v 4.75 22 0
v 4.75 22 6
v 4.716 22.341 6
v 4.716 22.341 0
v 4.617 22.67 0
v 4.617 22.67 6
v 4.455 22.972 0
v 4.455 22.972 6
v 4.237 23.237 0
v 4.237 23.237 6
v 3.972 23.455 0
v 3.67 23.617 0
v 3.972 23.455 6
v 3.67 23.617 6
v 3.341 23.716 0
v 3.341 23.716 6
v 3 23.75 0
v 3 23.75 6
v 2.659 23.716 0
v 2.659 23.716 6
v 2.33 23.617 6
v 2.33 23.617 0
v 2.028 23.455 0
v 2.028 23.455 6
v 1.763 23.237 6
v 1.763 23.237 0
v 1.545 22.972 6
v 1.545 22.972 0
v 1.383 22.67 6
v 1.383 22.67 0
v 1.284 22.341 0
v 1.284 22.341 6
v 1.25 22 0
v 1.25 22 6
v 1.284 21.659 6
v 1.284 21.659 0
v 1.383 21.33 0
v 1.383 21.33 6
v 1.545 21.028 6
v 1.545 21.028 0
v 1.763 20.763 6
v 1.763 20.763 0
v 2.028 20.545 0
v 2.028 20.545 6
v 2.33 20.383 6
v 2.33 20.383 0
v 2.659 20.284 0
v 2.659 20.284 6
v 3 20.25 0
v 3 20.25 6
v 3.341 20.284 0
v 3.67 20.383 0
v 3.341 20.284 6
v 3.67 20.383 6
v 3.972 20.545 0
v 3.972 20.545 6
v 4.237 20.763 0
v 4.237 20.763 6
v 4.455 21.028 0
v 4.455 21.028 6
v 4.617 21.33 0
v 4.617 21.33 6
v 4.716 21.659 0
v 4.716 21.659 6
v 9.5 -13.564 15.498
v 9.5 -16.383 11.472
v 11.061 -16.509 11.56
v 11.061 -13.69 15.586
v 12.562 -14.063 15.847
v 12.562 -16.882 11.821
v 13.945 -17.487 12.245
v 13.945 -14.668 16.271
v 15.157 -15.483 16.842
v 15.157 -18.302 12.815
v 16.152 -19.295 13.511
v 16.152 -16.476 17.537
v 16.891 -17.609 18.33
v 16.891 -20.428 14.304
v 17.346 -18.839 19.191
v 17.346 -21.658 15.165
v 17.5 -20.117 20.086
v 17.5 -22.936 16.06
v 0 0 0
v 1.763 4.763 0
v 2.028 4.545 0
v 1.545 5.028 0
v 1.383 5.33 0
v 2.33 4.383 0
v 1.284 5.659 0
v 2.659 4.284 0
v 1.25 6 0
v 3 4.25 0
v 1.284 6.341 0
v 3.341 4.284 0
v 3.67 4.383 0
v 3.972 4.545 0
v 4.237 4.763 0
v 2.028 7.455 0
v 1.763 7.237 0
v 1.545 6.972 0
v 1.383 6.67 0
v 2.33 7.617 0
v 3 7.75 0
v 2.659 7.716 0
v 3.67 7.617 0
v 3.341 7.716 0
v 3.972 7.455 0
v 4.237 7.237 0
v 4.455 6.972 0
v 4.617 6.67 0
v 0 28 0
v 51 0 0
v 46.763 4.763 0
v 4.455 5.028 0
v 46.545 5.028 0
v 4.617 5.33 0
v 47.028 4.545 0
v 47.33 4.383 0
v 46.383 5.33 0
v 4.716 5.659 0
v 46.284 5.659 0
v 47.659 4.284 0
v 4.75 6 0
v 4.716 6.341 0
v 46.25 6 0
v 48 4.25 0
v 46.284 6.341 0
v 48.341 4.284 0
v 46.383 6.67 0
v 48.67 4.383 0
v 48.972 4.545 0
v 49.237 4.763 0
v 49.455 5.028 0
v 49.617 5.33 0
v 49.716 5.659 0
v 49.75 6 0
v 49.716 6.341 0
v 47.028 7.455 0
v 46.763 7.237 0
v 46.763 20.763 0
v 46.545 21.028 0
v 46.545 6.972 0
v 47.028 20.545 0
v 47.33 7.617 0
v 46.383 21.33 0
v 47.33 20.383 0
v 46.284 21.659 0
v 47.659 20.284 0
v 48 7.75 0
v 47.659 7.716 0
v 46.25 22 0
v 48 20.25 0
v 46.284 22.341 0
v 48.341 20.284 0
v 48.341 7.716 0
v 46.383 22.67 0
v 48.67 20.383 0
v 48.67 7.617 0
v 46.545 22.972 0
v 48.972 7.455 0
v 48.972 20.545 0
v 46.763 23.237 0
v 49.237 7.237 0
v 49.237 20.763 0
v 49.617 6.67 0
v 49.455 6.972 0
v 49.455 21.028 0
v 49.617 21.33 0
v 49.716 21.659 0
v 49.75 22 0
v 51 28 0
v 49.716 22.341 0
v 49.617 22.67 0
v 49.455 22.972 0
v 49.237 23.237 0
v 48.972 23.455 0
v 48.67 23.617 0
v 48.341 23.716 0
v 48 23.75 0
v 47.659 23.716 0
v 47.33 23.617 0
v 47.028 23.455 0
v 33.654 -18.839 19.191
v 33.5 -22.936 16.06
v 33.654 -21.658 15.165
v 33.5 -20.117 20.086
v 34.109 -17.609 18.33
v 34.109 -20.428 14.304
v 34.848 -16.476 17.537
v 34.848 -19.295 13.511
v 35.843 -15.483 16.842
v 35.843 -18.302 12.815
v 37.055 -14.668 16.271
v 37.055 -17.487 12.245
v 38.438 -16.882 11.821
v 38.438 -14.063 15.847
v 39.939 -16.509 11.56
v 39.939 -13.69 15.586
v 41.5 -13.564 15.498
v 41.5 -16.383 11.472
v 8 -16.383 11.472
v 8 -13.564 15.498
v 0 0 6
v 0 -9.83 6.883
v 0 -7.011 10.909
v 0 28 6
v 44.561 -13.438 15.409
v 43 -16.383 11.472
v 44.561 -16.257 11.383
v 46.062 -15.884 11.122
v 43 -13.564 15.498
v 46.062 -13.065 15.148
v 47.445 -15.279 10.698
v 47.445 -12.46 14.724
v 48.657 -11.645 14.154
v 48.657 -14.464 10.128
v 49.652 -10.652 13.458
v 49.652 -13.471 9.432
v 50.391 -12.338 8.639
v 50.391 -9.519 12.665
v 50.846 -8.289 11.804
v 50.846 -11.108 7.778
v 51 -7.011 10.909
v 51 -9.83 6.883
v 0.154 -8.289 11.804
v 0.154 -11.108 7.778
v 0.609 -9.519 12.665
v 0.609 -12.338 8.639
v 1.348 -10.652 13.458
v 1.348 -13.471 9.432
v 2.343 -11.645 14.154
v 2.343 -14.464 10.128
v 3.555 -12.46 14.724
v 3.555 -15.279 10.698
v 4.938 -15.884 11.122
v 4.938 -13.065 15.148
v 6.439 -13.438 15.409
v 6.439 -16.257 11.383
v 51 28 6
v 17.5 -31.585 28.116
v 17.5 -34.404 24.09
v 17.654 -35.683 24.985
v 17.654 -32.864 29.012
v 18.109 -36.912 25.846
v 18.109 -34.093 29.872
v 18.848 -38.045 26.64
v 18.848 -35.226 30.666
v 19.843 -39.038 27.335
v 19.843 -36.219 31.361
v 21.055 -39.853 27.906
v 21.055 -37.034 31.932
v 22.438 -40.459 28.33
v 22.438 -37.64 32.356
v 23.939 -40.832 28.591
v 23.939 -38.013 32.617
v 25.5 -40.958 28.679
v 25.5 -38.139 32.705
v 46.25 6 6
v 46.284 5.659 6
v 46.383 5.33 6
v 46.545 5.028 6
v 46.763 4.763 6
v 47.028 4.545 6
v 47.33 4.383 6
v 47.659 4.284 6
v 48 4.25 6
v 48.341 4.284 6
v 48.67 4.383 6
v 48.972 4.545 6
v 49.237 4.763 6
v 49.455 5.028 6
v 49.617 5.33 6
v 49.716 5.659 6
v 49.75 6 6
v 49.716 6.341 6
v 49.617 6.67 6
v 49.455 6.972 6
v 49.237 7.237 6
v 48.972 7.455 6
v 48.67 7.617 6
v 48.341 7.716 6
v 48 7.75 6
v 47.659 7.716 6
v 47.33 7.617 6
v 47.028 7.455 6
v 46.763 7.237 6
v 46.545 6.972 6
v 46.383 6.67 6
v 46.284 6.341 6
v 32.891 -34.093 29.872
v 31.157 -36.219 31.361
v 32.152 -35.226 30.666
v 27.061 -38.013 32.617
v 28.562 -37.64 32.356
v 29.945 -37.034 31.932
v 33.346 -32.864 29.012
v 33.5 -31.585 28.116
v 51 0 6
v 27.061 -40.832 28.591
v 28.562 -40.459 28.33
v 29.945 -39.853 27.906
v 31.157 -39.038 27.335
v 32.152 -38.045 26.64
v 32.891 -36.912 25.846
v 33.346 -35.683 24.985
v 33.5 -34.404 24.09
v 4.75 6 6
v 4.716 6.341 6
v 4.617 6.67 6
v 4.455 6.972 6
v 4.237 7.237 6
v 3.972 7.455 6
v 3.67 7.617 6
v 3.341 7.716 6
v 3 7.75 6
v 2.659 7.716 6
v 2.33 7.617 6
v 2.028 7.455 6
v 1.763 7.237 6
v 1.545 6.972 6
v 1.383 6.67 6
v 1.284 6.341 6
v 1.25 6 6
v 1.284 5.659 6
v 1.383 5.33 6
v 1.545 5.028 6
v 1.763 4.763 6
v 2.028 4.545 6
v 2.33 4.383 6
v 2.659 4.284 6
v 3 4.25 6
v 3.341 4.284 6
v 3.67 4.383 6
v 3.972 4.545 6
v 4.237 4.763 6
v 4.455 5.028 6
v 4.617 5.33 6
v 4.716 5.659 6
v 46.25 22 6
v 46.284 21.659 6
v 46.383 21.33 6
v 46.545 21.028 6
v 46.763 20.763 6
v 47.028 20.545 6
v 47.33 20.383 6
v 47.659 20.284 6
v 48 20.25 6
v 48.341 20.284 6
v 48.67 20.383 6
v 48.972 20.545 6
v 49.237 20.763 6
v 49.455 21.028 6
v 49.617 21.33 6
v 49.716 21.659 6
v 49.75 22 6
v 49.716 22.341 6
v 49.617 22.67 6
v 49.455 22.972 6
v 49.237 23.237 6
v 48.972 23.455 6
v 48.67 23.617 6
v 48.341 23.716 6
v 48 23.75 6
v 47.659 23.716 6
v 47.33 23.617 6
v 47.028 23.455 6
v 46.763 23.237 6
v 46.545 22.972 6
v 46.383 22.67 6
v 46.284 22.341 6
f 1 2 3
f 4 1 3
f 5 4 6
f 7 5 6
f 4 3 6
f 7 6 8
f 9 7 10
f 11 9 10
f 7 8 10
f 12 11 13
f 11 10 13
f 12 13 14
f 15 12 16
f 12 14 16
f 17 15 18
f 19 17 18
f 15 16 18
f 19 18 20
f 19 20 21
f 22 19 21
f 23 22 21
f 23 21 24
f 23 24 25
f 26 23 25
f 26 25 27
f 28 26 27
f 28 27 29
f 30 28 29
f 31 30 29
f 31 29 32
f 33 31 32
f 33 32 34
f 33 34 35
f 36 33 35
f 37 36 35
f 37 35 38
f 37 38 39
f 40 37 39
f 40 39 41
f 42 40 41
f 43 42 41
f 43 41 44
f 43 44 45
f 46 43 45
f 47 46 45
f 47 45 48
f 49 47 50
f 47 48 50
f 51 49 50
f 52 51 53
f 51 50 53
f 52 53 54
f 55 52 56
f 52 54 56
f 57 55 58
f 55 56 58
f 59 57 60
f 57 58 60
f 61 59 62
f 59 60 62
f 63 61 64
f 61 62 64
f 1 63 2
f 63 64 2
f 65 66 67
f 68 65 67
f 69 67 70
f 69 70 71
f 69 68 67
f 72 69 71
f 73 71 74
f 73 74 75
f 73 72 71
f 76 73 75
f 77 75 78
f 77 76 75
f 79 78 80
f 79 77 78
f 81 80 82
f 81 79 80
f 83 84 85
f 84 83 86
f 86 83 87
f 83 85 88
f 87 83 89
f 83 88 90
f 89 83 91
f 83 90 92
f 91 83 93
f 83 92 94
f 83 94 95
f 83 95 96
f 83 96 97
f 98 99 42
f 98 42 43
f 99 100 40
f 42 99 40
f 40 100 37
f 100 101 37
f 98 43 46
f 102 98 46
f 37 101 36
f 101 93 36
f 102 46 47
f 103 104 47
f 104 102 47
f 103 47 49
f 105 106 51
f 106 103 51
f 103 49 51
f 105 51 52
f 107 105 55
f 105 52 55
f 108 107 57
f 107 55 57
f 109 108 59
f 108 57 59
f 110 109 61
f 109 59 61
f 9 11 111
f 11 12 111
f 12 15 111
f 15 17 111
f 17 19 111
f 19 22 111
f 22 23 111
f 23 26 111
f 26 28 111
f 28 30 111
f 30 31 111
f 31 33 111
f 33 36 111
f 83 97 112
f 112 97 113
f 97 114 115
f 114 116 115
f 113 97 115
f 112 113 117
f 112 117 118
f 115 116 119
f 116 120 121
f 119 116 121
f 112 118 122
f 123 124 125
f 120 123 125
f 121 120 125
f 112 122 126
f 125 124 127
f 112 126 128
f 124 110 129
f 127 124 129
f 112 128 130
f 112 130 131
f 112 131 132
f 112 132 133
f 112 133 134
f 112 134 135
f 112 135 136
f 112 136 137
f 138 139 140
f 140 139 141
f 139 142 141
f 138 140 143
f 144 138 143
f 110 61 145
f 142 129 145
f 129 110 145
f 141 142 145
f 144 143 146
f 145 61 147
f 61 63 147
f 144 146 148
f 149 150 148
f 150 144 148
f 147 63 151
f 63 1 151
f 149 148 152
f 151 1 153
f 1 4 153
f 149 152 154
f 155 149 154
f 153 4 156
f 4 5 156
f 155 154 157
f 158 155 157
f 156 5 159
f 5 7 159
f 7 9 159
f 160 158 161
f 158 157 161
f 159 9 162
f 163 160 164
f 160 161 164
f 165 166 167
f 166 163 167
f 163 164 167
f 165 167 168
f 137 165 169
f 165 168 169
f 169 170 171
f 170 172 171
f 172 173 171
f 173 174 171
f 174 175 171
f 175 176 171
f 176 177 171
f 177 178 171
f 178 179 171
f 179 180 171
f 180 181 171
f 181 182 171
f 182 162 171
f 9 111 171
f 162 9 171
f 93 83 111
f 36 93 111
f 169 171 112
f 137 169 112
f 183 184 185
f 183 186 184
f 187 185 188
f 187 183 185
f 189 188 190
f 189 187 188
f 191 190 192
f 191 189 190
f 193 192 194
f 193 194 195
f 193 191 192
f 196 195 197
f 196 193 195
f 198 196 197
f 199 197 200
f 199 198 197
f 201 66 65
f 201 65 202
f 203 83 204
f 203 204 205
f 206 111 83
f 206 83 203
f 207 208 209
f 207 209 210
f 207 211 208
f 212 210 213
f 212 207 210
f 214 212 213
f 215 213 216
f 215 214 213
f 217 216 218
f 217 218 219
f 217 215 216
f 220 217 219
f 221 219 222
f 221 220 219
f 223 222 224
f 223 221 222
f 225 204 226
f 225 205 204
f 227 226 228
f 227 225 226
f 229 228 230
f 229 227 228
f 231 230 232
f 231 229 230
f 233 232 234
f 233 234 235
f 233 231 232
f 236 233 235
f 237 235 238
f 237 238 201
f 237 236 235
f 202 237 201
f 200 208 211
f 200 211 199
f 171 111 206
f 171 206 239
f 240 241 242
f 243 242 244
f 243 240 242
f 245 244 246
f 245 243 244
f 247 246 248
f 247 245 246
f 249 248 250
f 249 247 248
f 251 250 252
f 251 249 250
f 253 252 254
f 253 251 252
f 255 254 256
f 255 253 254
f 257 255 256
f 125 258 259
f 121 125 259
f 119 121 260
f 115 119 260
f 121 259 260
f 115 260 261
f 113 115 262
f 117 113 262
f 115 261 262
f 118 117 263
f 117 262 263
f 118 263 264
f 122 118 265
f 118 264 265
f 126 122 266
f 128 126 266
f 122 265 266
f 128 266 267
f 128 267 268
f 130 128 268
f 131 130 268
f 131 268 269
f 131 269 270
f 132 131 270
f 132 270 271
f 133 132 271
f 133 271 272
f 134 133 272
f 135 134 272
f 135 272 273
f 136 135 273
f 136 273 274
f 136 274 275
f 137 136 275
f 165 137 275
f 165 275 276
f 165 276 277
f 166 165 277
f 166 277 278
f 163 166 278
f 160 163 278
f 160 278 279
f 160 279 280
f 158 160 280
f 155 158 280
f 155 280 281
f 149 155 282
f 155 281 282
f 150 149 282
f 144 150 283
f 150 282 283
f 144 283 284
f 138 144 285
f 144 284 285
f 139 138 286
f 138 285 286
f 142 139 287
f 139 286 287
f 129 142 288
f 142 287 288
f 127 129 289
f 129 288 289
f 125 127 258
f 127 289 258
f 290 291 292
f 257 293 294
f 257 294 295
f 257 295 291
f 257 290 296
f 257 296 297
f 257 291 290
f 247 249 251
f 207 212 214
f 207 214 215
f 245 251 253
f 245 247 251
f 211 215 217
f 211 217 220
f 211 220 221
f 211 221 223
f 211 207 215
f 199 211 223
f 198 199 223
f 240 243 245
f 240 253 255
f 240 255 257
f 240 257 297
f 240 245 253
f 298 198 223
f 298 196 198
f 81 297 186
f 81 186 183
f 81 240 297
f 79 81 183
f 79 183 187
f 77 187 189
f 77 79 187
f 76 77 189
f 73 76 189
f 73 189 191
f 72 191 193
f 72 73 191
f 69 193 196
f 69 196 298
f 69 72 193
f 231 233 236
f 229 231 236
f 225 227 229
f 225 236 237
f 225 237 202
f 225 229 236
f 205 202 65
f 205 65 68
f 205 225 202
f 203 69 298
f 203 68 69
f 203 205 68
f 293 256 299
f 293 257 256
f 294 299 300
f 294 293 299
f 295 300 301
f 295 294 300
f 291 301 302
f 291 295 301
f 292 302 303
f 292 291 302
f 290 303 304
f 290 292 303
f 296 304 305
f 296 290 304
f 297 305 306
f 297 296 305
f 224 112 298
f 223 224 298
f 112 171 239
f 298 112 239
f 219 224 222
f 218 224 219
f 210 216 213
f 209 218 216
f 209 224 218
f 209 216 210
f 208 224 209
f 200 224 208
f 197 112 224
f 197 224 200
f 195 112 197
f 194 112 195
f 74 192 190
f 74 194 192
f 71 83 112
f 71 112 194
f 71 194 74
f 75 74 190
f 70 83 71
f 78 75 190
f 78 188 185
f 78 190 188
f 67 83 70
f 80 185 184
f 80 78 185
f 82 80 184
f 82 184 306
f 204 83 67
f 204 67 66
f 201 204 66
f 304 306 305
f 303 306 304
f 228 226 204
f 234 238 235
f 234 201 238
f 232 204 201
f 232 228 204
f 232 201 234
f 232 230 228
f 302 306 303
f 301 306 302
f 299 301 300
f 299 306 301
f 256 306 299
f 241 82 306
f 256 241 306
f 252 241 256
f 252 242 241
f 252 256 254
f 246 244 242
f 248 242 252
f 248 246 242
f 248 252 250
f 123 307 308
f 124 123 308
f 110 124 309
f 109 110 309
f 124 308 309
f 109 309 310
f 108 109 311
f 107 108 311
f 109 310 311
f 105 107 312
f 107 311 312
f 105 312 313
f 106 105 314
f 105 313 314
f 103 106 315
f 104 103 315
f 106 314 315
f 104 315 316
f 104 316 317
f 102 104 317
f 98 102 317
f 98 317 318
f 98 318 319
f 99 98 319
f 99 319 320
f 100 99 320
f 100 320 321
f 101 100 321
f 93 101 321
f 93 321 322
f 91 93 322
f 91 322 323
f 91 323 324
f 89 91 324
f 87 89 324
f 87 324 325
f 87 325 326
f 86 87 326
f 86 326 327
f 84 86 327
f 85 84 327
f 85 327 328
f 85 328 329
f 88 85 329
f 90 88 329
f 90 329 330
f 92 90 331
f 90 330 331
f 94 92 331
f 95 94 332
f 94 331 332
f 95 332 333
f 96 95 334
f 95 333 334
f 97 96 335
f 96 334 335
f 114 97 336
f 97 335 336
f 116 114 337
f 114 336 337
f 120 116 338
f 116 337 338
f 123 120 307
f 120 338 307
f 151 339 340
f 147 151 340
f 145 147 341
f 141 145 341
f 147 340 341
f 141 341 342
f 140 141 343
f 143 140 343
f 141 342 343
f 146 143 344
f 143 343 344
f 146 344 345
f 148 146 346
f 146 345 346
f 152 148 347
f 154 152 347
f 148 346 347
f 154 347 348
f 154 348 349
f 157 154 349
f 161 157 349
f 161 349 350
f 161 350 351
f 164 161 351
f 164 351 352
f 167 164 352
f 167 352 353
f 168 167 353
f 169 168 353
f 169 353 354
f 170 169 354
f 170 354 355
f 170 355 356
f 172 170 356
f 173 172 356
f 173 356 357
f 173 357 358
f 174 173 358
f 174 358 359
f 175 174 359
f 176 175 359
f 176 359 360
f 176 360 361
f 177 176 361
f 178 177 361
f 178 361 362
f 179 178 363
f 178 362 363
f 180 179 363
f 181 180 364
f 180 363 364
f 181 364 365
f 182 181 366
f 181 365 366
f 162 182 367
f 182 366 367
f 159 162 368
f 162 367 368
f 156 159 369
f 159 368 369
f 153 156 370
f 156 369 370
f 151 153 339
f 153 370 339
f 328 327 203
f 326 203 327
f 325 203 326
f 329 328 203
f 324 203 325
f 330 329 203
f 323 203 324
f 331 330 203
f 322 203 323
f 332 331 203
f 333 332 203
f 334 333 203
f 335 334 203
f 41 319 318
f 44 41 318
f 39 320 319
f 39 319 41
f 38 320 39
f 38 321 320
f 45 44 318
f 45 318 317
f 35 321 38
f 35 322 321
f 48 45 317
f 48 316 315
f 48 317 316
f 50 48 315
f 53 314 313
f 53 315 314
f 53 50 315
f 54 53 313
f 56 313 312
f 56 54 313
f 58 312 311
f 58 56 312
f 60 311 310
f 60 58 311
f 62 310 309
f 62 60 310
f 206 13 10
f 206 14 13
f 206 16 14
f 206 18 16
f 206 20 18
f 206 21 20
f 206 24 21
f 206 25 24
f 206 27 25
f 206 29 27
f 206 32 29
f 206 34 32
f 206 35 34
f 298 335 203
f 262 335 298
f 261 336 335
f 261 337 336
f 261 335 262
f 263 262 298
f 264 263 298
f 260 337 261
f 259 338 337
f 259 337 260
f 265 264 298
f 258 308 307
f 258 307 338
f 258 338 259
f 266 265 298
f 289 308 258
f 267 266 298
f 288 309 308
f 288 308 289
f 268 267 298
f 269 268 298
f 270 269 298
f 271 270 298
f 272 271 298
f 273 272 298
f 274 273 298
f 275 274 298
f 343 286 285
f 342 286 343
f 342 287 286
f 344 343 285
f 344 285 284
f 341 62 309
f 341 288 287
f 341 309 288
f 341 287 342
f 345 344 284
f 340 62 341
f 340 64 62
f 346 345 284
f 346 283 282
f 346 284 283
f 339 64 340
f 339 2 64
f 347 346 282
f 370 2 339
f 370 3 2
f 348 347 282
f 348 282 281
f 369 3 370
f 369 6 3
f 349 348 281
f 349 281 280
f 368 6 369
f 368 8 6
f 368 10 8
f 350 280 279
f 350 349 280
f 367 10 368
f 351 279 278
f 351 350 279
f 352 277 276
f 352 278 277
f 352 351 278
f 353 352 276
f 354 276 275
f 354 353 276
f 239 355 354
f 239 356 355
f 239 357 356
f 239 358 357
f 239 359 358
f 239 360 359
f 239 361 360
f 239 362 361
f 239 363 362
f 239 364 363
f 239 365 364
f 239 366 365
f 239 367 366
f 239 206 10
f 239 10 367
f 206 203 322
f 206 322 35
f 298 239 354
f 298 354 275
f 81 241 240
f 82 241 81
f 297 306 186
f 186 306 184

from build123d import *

# Parameters (mm, degrees)
ESQUISSE1_W             = 51
ESQUISSE1_H             = 28
BOSS_EXTRU_1_DEPTH      = 6
ESQUISSE2_R             = 1.75
ENL_V_MAT_EXTRU_1_DEPTH = 59.489315264
BOSS_EXTRU_2_DEPTH      = 51
ESQUISSE4_W             = 17.5
ESQUISSE4_H             = 30
ENL_V_MAT_EXTRU_2_DEPTH = 4.914913
CONG_1_R                = 8


with BuildPart() as part:
    # Esquisse1 → Boss.-Extru.1 (new body)
    with BuildSketch(Plane.XY):
        with Locations((25.5, 14)):
            Rectangle(ESQUISSE1_W, ESQUISSE1_H)
    extrude(amount=BOSS_EXTRU_1_DEPTH)

    # Esquisse2 → Enlèv. mat.-Extru.1 (cut, through all)
    with BuildSketch(Plane.XY.offset(6)):
        with Locations((3, 6)):
            Circle(ESQUISSE2_R)
        with Locations((3, 22)):
            Circle(ESQUISSE2_R)
        with Locations(Location((48, 22, 0), (0, 0, 180))):
            Circle(ESQUISSE2_R)
        with Locations(Location((48, 6, 0), (0, 0, 180))):
            Circle(ESQUISSE2_R)
    extrude(amount=-ENL_V_MAT_EXTRU_1_DEPTH, mode=Mode.SUBTRACT)

    # Esquisse3 → Boss.-Extru.2 (add)
    with BuildSketch(Plane.ZY):
        Polygon((0, 0), (28.678821818, -40.957602214), (32.704882248, -38.138524352), (6, 0), align=None)
    extrude(amount=-BOSS_EXTRU_2_DEPTH)

    # Esquisse4 → Enlèv. mat.-Extru.2 (cut)
    with BuildSketch(Plane(origin=(0, 0, 0), x_dir=(-1, 0, 0), z_dir=(0, -0.5735764363510419, -0.8191520442889949))):
        with Locations((-8.75, -35)):
            Rectangle(ESQUISSE4_W, ESQUISSE4_H)
        with Locations((-42.25, -35)):
            Rectangle(ESQUISSE4_W, ESQUISSE4_H)
    extrude(amount=-ENL_V_MAT_EXTRU_2_DEPTH, mode=Mode.SUBTRACT)

    # Congé1
    cong_1_edges = [part.edges().sort_by_distance(p)[0] for p in [
        (33.5, -14.973501955, 13.484558942),
        (17.5, -14.973501955, 13.484558942),
        (33.5, -39.548063283, 30.691852033),
        (17.5, -39.548063283, 30.691852033),
        (0, -14.973501955, 13.484558942),
        (51, -14.973501955, 13.484558942),
    ]]
    fillet(cong_1_edges, radius=CONG_1_R - 0.0001)  # a hair under: the kernel refuses the full size


solid = part.part
